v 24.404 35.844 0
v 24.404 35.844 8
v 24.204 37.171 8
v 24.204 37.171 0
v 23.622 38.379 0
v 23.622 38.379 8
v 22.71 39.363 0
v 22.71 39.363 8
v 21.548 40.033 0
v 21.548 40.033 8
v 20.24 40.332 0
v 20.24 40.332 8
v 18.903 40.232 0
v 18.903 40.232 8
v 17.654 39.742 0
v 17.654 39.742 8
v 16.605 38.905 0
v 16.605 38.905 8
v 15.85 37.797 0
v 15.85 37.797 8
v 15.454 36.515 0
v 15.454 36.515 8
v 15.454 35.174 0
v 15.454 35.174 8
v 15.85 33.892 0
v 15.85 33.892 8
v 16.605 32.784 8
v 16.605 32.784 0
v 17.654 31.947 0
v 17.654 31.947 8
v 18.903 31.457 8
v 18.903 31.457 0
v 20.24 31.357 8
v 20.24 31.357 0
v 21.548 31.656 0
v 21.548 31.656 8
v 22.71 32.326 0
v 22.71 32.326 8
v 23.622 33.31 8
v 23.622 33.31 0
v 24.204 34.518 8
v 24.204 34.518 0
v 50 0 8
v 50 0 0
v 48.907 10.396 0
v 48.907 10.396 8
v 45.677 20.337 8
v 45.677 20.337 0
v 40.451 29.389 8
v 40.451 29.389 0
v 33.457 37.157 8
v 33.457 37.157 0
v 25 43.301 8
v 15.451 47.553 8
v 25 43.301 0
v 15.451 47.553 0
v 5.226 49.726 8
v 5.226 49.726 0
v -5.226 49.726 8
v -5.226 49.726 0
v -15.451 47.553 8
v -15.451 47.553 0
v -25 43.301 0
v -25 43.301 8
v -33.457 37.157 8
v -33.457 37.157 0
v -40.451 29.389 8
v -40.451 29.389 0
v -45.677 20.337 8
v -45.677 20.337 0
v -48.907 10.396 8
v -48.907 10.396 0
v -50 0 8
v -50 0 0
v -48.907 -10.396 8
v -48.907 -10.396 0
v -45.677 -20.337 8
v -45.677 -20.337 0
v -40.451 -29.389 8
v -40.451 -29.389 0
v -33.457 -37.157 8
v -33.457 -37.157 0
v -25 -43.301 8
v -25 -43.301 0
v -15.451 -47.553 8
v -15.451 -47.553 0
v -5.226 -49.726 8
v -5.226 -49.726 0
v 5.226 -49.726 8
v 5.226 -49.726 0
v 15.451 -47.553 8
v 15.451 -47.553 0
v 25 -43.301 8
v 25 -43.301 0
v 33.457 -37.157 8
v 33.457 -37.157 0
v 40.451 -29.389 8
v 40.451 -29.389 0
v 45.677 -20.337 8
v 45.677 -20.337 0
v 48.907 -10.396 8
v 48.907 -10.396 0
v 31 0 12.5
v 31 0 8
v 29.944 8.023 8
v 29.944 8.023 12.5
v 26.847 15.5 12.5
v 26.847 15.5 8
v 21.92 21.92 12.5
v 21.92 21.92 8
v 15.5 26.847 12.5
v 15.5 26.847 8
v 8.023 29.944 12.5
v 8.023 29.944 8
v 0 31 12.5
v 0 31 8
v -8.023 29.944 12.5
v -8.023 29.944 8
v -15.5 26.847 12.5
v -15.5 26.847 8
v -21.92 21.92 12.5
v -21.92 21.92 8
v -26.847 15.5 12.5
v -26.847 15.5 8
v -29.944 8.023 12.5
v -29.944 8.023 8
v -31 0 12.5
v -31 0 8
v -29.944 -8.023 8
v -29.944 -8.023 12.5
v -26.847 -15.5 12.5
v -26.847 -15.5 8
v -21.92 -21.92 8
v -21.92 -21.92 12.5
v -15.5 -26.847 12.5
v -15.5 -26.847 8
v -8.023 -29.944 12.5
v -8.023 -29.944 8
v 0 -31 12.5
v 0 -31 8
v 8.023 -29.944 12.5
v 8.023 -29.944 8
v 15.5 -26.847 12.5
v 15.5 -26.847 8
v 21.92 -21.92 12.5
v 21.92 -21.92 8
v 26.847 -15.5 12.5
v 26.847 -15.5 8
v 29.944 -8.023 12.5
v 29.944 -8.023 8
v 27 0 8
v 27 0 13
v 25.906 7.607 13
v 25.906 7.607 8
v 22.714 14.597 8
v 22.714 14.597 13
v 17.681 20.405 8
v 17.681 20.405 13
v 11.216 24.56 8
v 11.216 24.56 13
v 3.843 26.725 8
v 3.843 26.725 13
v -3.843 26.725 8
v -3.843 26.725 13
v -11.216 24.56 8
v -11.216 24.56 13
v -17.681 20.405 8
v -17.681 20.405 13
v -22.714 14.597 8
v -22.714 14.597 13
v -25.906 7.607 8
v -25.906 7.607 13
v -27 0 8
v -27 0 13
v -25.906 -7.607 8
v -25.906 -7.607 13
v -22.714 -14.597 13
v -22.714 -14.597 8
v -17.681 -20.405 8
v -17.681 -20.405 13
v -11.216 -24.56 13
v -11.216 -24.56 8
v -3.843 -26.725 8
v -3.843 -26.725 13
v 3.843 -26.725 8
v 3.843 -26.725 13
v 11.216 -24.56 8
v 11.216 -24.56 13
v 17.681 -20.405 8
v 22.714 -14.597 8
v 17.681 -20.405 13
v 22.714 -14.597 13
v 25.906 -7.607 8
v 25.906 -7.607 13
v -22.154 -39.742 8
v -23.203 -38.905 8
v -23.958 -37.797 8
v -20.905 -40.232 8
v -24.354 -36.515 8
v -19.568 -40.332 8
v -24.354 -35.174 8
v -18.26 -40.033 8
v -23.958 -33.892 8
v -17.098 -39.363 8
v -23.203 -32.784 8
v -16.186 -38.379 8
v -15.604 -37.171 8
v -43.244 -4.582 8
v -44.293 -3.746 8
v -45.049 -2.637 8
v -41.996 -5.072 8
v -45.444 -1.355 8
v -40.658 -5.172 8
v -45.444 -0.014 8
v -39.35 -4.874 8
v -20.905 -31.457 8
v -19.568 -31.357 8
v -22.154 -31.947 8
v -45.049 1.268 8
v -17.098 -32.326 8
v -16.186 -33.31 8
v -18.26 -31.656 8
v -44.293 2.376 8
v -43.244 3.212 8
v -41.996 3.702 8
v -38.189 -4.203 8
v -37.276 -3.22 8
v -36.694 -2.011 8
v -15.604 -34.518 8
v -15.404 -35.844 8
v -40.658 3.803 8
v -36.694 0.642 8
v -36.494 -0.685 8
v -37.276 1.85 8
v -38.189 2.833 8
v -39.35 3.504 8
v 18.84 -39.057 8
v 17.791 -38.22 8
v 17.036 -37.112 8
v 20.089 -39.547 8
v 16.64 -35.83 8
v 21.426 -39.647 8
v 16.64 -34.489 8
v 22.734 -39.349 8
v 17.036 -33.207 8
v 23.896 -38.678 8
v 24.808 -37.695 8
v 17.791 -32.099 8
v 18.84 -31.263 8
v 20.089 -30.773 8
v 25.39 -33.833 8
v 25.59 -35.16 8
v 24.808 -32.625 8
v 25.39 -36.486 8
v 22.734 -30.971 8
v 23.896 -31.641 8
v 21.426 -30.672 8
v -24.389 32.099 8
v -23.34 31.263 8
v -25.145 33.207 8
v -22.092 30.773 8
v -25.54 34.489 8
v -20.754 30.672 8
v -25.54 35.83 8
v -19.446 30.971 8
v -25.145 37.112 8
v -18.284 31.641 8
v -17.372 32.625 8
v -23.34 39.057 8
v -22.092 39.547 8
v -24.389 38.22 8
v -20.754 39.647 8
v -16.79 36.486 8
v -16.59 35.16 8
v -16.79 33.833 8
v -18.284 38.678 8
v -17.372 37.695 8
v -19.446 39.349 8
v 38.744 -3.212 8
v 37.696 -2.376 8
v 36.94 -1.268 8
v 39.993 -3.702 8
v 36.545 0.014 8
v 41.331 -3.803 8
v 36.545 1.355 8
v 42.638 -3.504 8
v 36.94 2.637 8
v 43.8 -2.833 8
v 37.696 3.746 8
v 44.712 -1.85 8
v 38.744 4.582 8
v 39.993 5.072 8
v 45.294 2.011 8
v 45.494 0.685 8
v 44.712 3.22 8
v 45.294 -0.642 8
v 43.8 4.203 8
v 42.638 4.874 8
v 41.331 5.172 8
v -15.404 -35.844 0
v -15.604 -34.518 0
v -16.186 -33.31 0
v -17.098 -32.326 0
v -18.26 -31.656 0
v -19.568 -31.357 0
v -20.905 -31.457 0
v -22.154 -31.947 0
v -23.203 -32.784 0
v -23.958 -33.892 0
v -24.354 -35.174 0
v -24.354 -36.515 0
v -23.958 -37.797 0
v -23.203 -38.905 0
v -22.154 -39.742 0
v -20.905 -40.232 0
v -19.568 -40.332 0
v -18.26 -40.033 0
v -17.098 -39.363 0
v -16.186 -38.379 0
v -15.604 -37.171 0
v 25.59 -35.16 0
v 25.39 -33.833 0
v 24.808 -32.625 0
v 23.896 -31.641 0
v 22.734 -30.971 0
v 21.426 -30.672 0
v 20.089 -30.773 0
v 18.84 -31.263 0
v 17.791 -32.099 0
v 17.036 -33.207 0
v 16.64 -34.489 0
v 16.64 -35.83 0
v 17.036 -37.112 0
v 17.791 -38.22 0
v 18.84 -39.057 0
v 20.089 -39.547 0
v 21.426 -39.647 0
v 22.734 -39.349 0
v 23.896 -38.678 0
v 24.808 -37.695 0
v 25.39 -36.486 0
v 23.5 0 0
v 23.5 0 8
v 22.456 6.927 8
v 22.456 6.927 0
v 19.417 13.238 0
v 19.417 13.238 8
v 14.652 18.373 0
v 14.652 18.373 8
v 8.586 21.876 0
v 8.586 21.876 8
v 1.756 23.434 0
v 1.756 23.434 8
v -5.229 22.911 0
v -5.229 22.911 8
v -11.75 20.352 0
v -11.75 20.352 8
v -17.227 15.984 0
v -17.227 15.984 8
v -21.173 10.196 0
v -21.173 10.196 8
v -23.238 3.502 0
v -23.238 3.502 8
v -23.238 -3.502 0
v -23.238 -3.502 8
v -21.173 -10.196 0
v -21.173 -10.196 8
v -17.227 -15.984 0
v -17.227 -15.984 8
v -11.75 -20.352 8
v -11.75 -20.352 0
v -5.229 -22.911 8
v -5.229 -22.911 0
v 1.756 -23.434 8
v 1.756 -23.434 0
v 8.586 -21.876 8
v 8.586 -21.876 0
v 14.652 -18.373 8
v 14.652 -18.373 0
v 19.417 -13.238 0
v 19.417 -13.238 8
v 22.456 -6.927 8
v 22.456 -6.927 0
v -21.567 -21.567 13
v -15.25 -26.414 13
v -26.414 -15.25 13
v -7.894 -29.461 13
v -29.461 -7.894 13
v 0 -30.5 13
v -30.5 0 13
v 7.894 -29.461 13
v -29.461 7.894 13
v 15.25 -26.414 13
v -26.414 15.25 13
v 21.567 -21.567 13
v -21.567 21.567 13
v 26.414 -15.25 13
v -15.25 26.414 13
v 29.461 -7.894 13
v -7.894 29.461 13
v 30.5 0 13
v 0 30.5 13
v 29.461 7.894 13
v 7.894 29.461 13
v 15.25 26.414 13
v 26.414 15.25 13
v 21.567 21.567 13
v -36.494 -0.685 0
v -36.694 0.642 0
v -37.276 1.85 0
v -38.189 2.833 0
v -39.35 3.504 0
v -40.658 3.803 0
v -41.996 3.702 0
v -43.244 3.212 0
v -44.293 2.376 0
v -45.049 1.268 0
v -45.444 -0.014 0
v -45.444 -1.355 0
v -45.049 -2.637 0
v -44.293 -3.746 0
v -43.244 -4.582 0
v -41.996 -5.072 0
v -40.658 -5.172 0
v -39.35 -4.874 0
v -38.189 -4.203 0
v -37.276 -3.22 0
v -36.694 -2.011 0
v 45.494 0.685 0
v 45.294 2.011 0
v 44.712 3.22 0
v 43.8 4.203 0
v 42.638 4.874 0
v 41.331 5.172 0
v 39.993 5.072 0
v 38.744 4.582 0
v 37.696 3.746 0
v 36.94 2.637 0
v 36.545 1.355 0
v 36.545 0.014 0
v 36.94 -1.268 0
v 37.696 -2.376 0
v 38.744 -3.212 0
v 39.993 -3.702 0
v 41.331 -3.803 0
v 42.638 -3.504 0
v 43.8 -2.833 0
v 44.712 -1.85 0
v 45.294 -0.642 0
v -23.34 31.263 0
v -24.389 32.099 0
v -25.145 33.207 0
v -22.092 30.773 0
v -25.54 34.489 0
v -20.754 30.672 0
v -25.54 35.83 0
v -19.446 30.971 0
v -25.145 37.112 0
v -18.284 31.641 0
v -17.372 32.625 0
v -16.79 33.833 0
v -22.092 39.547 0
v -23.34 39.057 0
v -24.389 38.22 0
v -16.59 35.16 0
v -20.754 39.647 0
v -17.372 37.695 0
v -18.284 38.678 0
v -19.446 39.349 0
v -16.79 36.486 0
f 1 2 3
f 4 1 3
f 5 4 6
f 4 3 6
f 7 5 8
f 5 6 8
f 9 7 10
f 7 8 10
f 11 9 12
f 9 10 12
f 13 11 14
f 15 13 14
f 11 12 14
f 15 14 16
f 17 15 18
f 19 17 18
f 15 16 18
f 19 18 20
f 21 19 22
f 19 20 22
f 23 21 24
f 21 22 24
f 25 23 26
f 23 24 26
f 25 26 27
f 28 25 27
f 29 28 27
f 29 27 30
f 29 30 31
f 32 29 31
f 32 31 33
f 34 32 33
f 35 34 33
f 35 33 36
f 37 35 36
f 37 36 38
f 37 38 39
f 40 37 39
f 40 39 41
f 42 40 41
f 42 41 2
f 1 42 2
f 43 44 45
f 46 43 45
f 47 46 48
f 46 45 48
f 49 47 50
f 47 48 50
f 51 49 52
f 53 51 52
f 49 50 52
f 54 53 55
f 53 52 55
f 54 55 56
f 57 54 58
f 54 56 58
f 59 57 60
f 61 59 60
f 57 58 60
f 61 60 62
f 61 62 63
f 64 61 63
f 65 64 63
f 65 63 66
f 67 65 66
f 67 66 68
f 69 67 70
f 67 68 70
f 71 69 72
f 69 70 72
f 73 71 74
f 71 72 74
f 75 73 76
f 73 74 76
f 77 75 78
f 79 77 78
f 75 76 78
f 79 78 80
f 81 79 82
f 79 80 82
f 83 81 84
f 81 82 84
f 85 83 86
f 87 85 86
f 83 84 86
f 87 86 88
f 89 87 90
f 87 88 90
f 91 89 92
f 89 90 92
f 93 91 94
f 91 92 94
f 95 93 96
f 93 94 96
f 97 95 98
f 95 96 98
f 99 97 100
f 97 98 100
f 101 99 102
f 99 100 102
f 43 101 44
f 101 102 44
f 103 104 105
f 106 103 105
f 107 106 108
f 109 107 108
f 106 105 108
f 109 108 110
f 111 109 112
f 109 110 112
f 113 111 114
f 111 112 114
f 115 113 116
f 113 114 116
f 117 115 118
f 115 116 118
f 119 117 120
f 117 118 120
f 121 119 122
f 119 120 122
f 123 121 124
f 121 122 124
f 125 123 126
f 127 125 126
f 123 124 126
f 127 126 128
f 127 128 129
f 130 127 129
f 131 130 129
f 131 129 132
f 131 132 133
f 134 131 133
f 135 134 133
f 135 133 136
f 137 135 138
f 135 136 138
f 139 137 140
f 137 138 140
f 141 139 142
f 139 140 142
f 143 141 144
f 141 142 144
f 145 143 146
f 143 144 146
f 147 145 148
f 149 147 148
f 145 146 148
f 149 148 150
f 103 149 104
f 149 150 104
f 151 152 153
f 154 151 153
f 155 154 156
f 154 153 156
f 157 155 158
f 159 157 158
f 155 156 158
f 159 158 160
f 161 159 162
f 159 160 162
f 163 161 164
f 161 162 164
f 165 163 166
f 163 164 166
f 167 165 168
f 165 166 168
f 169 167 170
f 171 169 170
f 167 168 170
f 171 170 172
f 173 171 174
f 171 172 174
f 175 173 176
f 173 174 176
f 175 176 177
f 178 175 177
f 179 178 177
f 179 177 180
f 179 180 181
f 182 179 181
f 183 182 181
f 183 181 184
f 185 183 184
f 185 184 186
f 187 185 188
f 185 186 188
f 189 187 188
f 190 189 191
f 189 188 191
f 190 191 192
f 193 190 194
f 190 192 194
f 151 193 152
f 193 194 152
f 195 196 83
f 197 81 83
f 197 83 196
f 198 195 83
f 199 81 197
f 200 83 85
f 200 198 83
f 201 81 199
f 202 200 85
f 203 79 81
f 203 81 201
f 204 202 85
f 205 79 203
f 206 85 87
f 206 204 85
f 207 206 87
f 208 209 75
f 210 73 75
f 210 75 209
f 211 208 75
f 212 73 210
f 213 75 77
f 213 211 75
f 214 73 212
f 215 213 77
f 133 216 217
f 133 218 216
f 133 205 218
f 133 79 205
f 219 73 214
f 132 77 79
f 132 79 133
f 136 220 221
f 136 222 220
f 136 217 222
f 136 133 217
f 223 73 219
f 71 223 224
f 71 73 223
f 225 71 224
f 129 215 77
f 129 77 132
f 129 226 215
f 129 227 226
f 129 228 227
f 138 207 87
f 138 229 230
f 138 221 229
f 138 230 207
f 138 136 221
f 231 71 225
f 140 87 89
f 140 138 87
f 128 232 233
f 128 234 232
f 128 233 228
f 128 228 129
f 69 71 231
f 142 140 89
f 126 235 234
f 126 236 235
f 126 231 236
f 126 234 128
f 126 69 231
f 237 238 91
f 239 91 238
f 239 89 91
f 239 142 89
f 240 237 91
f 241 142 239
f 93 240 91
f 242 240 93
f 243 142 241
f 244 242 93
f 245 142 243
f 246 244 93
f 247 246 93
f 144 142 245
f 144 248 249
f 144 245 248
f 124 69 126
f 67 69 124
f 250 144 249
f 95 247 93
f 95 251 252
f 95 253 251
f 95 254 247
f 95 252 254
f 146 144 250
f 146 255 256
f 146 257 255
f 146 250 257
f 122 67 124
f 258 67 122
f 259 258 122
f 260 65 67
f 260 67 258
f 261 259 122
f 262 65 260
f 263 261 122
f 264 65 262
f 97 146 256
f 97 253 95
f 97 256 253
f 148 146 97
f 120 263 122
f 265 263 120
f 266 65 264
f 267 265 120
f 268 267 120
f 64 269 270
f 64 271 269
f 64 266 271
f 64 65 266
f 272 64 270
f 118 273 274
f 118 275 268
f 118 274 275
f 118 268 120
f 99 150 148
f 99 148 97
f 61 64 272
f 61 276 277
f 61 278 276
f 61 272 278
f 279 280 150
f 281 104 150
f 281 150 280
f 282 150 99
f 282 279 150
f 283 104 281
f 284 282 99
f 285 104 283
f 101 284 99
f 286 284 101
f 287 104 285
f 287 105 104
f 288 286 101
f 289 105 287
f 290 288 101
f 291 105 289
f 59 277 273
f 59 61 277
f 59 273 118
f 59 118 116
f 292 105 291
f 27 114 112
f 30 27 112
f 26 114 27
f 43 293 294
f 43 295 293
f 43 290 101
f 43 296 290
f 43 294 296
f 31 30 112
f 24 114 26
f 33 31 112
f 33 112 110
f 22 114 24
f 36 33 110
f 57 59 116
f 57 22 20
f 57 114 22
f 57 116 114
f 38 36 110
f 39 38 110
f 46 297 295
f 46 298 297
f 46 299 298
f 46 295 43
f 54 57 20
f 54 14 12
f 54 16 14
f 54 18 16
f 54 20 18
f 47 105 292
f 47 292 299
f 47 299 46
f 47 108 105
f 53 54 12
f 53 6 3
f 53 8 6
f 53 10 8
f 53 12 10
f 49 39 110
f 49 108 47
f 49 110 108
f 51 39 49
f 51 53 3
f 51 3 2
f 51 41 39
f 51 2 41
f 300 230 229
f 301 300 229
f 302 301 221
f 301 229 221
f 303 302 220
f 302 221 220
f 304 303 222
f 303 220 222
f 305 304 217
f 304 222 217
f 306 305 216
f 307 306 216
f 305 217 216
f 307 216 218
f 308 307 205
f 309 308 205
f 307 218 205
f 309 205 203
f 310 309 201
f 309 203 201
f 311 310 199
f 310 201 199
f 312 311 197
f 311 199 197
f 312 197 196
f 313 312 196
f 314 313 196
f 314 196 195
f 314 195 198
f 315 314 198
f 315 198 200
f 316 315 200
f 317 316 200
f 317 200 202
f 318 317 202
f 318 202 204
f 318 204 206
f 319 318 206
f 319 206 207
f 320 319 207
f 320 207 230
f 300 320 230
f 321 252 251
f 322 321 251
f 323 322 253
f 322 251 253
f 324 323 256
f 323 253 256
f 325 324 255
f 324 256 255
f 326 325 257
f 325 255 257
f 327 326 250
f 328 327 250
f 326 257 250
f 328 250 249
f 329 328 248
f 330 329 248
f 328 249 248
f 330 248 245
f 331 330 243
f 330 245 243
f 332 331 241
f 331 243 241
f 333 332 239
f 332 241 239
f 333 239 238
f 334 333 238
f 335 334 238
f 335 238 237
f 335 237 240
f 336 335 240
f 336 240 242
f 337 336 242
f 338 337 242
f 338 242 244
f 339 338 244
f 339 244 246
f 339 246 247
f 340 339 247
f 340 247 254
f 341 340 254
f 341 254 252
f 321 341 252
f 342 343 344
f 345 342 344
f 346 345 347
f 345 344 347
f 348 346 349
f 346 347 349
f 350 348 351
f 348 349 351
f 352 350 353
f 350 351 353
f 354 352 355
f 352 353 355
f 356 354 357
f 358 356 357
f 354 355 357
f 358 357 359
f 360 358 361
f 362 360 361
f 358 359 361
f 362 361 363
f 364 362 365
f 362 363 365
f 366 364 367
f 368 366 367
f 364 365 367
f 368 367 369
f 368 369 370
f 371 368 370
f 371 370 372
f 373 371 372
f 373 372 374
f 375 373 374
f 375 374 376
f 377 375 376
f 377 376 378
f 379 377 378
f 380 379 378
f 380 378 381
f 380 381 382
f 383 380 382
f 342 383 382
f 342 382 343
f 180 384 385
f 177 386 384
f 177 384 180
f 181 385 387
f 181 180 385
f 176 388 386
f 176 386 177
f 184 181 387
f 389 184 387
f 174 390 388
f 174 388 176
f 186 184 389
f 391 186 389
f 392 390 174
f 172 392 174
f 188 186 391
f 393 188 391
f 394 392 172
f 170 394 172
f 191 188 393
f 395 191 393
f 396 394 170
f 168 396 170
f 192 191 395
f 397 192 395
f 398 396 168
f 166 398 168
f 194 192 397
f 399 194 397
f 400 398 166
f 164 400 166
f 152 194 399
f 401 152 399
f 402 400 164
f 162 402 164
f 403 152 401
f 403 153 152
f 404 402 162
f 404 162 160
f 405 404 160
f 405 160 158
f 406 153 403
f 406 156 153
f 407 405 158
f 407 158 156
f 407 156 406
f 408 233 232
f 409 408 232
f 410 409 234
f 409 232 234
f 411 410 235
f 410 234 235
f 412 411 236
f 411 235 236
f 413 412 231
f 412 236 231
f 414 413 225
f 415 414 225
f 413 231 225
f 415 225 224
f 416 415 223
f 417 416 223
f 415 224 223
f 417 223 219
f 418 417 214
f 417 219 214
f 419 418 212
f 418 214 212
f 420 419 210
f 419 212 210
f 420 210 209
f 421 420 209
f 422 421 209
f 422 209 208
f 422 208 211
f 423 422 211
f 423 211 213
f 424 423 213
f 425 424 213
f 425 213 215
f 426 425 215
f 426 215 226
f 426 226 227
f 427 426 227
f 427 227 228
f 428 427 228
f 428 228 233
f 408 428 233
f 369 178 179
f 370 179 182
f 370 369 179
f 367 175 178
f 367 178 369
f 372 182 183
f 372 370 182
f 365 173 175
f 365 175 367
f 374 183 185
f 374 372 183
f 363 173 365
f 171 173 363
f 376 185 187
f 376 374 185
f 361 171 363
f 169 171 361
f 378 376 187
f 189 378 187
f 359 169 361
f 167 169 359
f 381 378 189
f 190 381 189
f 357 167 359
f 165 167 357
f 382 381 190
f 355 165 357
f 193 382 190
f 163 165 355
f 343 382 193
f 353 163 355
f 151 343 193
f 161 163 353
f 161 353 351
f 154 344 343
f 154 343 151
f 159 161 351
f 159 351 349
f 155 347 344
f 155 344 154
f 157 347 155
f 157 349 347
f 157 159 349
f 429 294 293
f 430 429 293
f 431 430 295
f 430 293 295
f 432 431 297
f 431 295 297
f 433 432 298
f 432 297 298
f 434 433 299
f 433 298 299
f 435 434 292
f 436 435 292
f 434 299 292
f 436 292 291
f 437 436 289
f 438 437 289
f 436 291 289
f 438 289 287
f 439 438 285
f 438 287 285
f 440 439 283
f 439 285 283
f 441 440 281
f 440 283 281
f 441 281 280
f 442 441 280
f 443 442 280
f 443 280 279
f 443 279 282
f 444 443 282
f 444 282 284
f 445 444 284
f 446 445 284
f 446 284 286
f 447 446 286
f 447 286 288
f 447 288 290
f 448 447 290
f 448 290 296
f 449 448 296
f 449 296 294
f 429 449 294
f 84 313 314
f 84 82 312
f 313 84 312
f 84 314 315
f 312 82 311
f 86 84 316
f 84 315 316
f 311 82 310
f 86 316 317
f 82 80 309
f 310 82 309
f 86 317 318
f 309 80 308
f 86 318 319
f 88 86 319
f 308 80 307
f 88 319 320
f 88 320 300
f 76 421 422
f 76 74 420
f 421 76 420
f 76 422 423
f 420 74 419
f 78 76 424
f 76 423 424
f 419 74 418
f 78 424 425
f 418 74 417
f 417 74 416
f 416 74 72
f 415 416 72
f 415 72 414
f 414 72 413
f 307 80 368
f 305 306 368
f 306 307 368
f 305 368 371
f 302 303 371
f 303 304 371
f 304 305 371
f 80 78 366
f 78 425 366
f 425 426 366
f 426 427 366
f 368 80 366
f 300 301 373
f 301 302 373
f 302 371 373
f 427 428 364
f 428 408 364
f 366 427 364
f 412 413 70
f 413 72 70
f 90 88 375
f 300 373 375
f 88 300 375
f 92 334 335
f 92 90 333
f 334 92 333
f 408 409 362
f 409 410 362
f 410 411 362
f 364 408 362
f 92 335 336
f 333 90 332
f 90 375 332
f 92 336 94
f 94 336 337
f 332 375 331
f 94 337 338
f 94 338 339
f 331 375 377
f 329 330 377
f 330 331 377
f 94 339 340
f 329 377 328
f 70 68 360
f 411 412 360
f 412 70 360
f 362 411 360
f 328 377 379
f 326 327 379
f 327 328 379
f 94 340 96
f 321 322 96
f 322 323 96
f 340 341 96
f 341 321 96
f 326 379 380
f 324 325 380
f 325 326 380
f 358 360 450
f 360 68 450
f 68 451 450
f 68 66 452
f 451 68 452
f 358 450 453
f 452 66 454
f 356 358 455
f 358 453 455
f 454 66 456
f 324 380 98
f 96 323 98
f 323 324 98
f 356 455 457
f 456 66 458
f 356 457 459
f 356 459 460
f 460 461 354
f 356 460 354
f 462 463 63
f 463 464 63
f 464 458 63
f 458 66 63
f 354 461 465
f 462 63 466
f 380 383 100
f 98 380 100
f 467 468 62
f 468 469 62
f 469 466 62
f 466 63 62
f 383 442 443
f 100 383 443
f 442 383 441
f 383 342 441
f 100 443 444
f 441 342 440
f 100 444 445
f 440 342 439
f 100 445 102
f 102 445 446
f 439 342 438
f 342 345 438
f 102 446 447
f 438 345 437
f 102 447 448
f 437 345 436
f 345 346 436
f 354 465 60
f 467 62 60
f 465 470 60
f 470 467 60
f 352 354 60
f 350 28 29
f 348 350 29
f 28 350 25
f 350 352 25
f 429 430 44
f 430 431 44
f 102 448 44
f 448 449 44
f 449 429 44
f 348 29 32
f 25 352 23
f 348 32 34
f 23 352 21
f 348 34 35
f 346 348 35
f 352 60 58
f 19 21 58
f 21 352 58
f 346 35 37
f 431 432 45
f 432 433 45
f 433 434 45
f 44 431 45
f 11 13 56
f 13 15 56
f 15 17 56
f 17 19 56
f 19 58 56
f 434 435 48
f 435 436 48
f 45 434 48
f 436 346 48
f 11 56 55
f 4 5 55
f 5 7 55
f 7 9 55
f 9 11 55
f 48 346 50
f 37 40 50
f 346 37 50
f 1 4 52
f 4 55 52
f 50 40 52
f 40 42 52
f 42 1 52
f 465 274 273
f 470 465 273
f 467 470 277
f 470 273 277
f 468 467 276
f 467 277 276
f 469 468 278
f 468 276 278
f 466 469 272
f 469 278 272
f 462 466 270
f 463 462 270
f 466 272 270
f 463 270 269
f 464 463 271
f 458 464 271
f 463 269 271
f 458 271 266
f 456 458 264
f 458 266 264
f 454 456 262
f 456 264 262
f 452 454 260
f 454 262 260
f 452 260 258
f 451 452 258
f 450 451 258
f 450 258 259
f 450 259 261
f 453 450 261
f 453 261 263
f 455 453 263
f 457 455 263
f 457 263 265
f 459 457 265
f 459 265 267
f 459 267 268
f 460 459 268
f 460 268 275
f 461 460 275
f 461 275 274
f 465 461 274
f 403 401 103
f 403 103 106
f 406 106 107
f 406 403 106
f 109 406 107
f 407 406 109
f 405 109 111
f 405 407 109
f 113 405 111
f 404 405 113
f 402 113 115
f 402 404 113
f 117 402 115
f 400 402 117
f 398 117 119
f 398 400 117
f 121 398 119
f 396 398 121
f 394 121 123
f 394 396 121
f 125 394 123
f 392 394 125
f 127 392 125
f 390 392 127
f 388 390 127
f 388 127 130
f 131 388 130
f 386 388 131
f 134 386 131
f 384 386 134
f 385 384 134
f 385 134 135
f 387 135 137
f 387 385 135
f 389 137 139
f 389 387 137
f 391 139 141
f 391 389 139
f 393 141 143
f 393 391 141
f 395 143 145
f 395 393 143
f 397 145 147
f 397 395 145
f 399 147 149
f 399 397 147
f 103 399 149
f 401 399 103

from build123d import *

# Parameters (mm, degrees)
SKETCH_1_R          = 50
EXTRUDE_1_DEPTH     = 8
SKETCH_2_R          = 31
EXTRUDE_2_DEPTH     = 5
SKETCH_3_R          = 27
CUT_EXTRUDE_2_DEPTH = 5
SKETCH_4_R          = 23.5
CUT_EXTRUDE_3_DEPTH = 72.161787499
SKETCH_5_R          = 4.5
CUT_EXTRUDE_4_DEPTH = 72.161787499
CHAMFER_1_SIZE      = 0.5


with BuildPart() as part:
    # 草图1 → 凸台-拉伸1 (new body)
    with BuildSketch(Plane.XY):
        Circle(SKETCH_1_R)
    extrude(amount=EXTRUDE_1_DEPTH)

    # 草图2 → 凸台-拉伸2 (add)
    with BuildSketch(Plane.XY.offset(8)):
        Circle(SKETCH_2_R)
    extrude(amount=EXTRUDE_2_DEPTH)

    # 草图3 → 切除-拉伸2 (cut)
    with BuildSketch(Plane.XY.offset(13)):
        Circle(SKETCH_3_R)
    extrude(amount=-CUT_EXTRUDE_2_DEPTH, mode=Mode.SUBTRACT)

    # 草图4 → 切除-拉伸3 (cut, through all)
    with BuildSketch(Plane.XY.offset(8)):
        Circle(SKETCH_4_R)
    extrude(amount=-CUT_EXTRUDE_3_DEPTH, mode=Mode.SUBTRACT)

    # 草图5 → 切除-拉伸4 (cut, through all)
    with BuildSketch(Plane.XY.offset(8)):
        with Locations((40.994281337, 0.684761001)):
            Circle(SKETCH_5_R)
        with Locations((21.090161091, -35.159708548)):
            Circle(SKETCH_5_R)
        with Locations((-19.904120246, -35.844469549)):
            Circle(SKETCH_5_R)
        with Locations((-40.994281337, -0.684761001)):
            Circle(SKETCH_5_R)
        with Locations((-21.090161091, 35.159708548)):
            Circle(SKETCH_5_R)
        with Locations((19.904120246, 35.844469549)):
            Circle(SKETCH_5_R)
    extrude(amount=-CUT_EXTRUDE_4_DEPTH, mode=Mode.SUBTRACT)

    # 倒角1
    chamfer_1_edges = [part.edges().sort_by_distance(p)[0] for p in [
        (-31, 0, 13),
    ]]
    chamfer(chamfer_1_edges, length=CHAMFER_1_SIZE)


solid = part.part
